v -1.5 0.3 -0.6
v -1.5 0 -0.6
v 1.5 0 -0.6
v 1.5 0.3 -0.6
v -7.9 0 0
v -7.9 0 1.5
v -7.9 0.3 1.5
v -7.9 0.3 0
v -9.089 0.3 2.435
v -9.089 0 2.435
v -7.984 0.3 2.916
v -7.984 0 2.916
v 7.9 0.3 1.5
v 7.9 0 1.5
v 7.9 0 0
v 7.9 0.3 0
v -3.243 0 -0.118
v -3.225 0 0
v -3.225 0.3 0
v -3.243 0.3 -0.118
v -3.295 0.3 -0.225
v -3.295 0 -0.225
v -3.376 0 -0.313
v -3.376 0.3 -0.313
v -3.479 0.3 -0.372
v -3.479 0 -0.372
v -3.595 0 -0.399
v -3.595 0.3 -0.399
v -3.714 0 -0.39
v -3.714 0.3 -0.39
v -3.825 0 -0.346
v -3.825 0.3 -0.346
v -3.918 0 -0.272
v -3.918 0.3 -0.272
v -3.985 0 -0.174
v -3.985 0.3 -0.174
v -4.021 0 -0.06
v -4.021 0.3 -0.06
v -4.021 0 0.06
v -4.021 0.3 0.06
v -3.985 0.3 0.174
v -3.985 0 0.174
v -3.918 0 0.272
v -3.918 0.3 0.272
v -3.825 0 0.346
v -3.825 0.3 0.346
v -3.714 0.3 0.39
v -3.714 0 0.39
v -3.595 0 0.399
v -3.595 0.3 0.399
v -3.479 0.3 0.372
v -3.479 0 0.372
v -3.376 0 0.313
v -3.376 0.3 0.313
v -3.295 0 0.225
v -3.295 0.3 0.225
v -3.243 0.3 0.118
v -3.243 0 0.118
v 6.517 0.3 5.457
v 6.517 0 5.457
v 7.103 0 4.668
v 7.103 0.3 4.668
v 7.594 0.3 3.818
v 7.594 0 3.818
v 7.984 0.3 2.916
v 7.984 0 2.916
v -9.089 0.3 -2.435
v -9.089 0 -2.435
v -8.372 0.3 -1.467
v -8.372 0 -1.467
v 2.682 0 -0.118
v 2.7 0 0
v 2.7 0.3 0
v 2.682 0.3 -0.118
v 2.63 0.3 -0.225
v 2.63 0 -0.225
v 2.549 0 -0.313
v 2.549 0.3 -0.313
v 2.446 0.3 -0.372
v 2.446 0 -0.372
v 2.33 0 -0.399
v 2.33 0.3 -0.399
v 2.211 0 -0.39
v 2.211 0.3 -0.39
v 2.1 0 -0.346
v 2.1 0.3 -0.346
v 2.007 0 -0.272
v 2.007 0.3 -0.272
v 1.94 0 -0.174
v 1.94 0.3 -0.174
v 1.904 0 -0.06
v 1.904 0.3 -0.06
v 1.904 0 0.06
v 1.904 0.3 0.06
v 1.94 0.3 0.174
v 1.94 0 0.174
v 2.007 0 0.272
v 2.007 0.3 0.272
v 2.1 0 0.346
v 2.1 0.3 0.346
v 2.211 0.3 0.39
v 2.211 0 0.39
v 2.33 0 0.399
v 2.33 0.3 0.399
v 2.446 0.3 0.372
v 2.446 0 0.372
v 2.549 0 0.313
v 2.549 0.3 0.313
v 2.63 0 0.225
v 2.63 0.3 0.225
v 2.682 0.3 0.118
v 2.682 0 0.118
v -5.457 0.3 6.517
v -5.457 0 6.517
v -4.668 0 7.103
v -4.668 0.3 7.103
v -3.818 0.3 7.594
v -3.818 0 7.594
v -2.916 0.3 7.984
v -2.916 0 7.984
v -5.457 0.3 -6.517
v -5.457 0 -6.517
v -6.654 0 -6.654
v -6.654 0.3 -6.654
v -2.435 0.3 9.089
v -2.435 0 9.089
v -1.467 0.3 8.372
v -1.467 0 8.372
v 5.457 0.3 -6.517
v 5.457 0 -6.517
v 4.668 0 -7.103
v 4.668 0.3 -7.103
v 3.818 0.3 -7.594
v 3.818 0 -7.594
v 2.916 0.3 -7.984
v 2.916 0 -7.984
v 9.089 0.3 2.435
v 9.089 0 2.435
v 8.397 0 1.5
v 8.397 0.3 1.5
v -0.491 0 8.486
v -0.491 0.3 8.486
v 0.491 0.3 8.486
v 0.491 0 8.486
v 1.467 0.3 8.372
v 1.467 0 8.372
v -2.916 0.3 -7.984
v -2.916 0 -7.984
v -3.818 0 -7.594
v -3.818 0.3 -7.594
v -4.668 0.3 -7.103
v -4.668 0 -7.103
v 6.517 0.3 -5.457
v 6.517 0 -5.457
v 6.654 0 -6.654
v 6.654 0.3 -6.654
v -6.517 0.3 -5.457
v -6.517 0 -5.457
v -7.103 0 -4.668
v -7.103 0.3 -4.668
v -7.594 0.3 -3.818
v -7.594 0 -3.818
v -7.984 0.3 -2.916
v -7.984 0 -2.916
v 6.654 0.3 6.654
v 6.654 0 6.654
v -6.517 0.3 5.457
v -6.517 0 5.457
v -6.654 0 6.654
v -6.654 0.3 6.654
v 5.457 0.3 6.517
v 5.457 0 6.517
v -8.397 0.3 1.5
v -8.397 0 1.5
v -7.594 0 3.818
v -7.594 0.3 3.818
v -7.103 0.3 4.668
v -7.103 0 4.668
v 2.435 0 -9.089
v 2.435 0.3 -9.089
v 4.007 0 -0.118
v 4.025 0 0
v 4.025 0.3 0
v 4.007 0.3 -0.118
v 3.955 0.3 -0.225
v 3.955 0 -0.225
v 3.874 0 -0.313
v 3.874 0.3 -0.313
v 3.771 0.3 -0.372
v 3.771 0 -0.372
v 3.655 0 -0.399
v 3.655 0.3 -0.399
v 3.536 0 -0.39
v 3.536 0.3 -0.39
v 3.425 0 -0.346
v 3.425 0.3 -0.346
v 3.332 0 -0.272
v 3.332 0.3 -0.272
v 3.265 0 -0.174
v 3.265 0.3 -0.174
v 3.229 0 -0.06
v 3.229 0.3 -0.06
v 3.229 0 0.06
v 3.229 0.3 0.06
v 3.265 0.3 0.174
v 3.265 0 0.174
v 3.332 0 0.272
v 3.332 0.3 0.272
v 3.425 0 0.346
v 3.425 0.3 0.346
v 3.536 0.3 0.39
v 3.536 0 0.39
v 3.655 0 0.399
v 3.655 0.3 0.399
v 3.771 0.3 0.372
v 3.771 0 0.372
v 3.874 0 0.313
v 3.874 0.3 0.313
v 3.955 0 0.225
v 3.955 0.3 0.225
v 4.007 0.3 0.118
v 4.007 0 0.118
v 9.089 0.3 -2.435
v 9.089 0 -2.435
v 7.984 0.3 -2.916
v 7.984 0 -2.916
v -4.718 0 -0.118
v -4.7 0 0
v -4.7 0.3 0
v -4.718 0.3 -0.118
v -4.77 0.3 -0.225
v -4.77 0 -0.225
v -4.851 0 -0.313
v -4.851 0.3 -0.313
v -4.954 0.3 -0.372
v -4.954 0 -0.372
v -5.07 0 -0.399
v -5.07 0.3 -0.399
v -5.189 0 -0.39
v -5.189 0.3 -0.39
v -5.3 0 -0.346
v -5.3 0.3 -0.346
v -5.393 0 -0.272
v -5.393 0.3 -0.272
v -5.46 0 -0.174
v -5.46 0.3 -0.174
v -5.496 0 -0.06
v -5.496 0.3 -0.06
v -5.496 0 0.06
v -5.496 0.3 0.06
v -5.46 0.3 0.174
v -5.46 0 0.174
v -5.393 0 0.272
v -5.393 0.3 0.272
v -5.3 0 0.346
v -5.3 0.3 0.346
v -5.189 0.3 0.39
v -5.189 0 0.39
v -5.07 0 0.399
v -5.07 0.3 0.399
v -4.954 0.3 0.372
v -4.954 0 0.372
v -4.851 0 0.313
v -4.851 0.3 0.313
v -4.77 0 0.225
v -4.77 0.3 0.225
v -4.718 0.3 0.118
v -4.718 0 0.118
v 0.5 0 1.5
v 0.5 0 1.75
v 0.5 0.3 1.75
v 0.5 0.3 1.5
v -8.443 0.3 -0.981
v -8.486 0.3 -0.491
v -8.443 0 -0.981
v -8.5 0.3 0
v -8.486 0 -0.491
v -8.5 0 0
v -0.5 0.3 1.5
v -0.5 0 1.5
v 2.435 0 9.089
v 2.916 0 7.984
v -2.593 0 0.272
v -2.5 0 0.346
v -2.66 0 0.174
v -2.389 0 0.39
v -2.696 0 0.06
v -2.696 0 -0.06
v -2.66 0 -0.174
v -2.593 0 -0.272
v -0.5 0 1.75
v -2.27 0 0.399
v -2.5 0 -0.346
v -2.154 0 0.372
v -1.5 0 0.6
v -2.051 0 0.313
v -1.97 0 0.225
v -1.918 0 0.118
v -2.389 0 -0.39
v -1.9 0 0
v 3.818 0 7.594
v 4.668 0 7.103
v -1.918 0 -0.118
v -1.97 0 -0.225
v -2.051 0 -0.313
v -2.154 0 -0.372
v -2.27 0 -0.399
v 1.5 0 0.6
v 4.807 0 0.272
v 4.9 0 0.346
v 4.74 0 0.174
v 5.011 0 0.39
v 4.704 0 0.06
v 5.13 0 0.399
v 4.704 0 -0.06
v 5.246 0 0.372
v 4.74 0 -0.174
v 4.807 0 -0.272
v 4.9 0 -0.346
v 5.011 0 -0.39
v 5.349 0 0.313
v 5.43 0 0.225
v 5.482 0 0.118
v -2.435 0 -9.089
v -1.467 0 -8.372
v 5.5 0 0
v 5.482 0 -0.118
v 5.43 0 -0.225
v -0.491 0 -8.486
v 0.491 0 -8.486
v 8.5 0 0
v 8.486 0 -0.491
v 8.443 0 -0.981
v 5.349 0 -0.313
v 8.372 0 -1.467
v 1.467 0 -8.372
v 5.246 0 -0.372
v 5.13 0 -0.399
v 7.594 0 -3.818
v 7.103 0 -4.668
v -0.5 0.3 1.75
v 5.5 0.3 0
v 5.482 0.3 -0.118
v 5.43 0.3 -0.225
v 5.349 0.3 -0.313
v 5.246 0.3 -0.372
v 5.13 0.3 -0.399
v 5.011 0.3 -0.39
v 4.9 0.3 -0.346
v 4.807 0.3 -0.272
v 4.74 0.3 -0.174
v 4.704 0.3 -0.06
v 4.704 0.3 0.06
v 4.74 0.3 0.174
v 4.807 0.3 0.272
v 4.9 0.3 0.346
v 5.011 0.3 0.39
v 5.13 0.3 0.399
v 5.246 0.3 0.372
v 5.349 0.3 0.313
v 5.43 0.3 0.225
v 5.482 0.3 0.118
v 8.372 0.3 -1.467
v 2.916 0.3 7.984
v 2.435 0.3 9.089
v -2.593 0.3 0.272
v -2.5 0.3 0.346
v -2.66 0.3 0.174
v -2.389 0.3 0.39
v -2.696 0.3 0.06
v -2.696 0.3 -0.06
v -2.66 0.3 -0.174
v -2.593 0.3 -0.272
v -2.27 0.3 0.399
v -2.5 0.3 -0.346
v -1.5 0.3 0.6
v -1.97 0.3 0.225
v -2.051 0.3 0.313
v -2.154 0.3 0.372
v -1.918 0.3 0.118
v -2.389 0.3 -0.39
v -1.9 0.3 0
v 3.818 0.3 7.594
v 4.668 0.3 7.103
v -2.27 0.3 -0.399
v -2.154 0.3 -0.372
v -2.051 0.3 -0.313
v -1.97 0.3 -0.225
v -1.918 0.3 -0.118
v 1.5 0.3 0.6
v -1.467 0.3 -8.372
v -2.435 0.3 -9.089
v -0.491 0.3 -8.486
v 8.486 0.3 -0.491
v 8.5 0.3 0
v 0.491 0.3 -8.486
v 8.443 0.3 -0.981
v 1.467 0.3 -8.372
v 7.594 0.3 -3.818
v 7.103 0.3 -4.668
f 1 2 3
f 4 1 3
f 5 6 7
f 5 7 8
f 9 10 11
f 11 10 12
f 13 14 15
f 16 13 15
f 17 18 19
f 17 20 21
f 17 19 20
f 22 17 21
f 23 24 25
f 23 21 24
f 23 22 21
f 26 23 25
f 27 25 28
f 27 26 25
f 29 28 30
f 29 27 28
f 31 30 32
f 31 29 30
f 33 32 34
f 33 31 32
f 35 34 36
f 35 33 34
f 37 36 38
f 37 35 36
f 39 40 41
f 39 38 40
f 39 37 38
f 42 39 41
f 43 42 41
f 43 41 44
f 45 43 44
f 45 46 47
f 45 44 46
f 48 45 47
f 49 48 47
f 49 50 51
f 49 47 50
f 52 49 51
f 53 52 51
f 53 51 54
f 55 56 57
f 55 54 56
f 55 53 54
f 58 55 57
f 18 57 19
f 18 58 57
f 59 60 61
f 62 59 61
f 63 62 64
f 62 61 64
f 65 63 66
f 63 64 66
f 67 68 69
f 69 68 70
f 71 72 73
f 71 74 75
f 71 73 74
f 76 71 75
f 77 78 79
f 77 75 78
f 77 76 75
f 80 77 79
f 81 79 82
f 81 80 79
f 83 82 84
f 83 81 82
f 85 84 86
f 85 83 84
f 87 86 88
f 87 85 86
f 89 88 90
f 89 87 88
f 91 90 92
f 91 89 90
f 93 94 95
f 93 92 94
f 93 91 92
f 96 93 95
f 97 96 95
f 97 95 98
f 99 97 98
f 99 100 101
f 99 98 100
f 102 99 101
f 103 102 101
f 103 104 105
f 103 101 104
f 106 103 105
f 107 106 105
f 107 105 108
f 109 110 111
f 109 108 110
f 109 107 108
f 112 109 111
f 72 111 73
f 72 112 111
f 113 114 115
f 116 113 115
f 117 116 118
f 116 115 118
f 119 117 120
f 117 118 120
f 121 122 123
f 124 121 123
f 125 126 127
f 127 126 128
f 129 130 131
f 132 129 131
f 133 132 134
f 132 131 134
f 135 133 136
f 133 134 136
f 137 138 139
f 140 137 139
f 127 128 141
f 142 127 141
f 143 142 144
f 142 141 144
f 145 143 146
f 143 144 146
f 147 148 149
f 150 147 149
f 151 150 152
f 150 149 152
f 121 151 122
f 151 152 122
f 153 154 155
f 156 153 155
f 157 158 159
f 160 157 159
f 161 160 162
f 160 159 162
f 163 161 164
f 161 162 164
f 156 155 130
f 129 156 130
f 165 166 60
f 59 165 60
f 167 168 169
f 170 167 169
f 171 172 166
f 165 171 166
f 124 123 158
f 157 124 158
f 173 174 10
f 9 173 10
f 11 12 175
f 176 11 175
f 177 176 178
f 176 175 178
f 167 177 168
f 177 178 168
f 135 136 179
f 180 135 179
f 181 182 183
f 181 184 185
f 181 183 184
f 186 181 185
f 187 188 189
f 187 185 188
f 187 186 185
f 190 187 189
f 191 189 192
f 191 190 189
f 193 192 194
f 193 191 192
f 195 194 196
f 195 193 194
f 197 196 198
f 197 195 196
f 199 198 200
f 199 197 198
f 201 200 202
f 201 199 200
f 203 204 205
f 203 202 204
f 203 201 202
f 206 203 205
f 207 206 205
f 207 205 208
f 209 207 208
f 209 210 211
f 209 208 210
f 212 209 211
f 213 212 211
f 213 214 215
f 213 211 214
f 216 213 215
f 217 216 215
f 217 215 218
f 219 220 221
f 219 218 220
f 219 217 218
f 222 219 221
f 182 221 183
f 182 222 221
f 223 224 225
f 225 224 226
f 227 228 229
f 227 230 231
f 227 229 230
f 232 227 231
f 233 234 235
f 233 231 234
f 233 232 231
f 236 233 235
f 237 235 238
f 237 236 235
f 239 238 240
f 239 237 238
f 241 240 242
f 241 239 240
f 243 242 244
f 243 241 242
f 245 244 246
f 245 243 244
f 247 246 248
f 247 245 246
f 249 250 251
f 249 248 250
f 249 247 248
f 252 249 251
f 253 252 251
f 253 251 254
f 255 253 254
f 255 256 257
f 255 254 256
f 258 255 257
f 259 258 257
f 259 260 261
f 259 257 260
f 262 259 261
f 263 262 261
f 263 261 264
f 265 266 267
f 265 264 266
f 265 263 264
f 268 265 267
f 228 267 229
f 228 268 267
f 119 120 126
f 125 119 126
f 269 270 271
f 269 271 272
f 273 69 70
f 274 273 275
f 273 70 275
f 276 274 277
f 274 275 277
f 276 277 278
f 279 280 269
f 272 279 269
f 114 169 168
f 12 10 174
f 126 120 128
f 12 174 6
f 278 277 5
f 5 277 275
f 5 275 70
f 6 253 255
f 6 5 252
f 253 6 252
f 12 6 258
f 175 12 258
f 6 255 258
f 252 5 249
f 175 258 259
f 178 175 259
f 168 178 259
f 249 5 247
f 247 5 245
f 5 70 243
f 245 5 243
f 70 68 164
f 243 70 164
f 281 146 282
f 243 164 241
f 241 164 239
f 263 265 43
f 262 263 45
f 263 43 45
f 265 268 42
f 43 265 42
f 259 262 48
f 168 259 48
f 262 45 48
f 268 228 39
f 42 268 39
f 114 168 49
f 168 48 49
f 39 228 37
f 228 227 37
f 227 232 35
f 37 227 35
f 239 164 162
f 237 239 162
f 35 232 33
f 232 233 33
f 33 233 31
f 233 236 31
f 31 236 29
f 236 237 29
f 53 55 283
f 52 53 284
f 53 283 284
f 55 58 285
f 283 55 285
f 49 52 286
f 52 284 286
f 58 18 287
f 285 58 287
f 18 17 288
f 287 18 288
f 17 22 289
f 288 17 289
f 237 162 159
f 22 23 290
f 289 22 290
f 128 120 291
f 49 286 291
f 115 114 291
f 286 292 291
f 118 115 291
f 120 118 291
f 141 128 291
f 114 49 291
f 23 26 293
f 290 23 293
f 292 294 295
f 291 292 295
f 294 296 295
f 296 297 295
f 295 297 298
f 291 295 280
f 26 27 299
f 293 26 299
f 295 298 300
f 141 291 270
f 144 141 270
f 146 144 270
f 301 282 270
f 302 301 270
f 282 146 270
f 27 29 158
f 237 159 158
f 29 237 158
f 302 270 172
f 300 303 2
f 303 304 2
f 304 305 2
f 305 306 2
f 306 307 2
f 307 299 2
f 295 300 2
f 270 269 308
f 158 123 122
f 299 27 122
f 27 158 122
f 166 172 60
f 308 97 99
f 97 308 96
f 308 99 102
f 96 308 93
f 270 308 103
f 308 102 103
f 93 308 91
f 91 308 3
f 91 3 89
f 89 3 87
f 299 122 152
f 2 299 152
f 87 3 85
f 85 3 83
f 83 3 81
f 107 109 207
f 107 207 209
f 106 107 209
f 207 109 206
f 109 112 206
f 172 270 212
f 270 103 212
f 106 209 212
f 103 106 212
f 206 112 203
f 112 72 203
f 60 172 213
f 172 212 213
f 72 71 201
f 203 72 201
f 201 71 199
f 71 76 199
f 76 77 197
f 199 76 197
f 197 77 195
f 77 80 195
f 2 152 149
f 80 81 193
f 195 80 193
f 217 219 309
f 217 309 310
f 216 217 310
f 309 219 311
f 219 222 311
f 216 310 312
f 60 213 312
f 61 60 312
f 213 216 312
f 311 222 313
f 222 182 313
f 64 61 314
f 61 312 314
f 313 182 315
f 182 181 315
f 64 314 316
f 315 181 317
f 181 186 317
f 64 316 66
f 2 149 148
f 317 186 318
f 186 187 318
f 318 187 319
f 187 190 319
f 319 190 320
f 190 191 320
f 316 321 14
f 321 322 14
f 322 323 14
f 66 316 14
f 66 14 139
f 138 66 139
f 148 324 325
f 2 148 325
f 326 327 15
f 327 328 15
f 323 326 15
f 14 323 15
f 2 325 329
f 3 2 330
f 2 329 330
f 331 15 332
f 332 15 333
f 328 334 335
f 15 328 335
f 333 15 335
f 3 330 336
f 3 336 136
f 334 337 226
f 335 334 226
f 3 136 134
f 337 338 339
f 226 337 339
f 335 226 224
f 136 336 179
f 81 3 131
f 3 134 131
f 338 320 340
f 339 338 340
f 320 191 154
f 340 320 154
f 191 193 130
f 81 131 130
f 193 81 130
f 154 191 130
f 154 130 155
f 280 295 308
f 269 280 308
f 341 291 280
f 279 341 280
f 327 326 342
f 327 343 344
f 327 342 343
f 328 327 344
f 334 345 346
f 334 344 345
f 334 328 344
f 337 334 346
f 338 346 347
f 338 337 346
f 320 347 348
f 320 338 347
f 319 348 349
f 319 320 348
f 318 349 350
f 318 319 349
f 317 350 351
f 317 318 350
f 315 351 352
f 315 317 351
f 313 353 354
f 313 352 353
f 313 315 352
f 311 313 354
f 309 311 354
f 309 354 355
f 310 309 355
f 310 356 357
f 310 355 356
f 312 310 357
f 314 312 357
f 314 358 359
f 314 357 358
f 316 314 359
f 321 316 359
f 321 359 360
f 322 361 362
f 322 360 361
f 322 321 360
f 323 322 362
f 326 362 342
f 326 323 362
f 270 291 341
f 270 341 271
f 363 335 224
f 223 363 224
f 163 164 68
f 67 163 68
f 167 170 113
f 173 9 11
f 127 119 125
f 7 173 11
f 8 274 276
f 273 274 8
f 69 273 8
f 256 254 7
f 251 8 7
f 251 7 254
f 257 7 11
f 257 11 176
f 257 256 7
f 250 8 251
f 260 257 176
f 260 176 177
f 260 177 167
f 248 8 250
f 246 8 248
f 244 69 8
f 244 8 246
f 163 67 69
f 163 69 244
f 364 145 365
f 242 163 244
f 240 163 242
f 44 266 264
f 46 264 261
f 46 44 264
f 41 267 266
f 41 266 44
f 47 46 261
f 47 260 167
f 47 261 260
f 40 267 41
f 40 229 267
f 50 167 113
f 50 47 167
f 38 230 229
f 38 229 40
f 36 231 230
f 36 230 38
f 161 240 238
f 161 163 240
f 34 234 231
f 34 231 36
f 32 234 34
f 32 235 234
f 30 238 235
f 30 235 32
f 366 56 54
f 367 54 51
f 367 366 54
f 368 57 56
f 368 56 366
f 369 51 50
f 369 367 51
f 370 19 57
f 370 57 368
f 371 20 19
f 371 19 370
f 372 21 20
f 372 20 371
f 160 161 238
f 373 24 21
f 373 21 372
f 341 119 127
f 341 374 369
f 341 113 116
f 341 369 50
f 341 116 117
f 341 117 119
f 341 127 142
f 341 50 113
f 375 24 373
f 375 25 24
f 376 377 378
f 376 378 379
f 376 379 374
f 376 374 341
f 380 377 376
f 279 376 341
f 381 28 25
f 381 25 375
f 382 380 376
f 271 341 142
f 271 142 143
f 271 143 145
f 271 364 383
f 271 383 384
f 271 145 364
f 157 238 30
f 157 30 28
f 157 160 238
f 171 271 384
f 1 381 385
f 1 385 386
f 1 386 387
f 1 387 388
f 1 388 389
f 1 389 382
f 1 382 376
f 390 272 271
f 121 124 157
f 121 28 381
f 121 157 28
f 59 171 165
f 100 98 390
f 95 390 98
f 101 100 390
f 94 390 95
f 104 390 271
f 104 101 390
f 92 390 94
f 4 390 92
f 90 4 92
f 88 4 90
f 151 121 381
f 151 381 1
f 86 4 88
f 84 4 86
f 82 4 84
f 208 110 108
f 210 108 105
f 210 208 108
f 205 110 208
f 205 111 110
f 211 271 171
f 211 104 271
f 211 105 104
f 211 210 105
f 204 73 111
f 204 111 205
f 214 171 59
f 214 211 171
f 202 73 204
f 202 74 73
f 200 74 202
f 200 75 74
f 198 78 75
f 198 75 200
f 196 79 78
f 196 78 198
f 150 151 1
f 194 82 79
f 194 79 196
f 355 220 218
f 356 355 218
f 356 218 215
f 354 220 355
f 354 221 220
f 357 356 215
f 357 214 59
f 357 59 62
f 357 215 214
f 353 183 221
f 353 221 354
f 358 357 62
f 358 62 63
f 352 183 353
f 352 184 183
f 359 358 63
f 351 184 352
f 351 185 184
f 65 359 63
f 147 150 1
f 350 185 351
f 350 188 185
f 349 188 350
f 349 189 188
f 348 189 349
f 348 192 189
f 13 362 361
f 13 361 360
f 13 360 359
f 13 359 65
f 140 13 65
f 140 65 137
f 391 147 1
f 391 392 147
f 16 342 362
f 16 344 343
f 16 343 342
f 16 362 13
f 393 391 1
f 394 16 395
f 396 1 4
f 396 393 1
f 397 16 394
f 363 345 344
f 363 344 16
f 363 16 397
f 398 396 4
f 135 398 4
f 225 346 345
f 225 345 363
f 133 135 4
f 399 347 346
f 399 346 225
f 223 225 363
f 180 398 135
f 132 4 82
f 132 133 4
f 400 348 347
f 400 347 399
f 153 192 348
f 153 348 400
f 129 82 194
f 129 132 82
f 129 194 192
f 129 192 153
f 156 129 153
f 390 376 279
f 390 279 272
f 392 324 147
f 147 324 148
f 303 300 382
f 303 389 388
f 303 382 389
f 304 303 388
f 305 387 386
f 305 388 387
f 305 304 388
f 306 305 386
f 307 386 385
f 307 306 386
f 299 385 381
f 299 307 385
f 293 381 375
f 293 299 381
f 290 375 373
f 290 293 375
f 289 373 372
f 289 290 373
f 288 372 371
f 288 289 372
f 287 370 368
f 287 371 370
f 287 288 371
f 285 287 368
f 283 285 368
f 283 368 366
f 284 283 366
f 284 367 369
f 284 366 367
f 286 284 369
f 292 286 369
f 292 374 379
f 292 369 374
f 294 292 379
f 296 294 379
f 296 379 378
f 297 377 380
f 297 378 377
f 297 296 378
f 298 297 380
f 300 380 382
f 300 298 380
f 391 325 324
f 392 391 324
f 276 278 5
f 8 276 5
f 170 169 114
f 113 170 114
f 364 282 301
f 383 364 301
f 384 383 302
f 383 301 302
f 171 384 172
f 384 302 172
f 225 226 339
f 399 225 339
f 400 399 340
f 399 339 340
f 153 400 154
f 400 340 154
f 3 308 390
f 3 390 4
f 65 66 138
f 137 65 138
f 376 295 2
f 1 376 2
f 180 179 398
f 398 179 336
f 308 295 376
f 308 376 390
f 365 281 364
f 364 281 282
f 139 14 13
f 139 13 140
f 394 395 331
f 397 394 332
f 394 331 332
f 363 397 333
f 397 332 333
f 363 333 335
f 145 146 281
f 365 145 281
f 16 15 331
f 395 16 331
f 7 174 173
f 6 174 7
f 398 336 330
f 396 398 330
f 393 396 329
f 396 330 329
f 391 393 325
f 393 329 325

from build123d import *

# Parameters (mm, degrees)
EXTRUDE1_DEPTH = 0.3
SKETCH3_R      = 0.4
SKETCH3_W      = 3
SKETCH3_H      = 1.2
EXTRUDE2_DEPTH = 1.3
SKETCH4_W      = 1
SKETCH4_H      = 0.25
EXTRUDE3_DEPTH = 24
SKETCH5_W      = 1.5
SKETCH5_H      = 1.5
EXTRUDE5_DEPTH = 1


with BuildPart() as part:
    # Sketch1 → Extrude1 (new body)
    with BuildSketch(Plane(origin=(0, 0, 0), x_dir=(1, 0, 0), z_dir=(0, 1, 0))):
        with BuildLine():
            Line((-2.435487214, 9.089362025), (-2.915825654, 7.984232008))
            ThreePointArc((-2.915825654, 7.984232008), (-4.25, 7.361215932), (-5.456634922, 6.517295093))
            Line((-5.456634922, 6.517295093), (-6.653874811, 6.653874811))
            Line((-6.653874811, 6.653874811), (-6.517295093, 5.456634922))
            ThreePointArc((-6.517295093, 5.456634922), (-7.361215932, 4.25), (-7.984232008, 2.915825654))
            Line((-7.984232008, 2.915825654), (-9.089362025, 2.435487214))
            Line((-9.089362025, 2.435487214), (-8.372460576, 1.466936915))
            ThreePointArc((-8.372460576, 1.466936915), (-8.5, 0), (-8.372460576, -1.466936915))
            Line((-8.372460576, -1.466936915), (-9.089362025, -2.435487214))
            Line((-9.089362025, -2.435487214), (-7.984232008, -2.915825654))
            ThreePointArc((-7.984232008, -2.915825654), (-7.361215932, -4.25), (-6.517295093, -5.456634922))
            Line((-6.517295093, -5.456634922), (-6.653874811, -6.653874811))
            Line((-6.653874811, -6.653874811), (-5.456634922, -6.517295093))
            ThreePointArc((-5.456634922, -6.517295093), (-4.25, -7.361215932), (-2.915825654, -7.984232008))
            Line((-2.915825654, -7.984232008), (-2.435487214, -9.089362025))
            Line((-2.435487214, -9.089362025), (-1.466936915, -8.372460576))
            ThreePointArc((-1.466936915, -8.372460576), (0, -8.5), (1.466936915, -8.372460576))
            Line((1.466936915, -8.372460576), (2.435487214, -9.089362025))
            Line((2.435487214, -9.089362025), (2.915825654, -7.984232008))
            ThreePointArc((2.915825654, -7.984232008), (4.25, -7.361215932), (5.456634922, -6.517295093))
            Line((5.456634922, -6.517295093), (6.653874811, -6.653874811))
            Line((6.653874811, -6.653874811), (6.517295093, -5.456634922))
            ThreePointArc((6.517295093, -5.456634922), (7.361215932, -4.25), (7.984232008, -2.915825654))
            Line((7.984232008, -2.915825654), (9.089362025, -2.435487214))
            Line((9.089362025, -2.435487214), (8.372460576, -1.466936915))
            ThreePointArc((8.372460576, -1.466936915), (8.5, 0), (8.372460576, 1.466936915))
            Line((8.372460576, 1.466936915), (9.089362025, 2.435487214))
            Line((9.089362025, 2.435487214), (7.984232008, 2.915825654))
            ThreePointArc((7.984232008, 2.915825654), (7.361215932, 4.25), (6.517295093, 5.456634922))
            Line((6.517295093, 5.456634922), (6.653874811, 6.653874811))
            Line((6.653874811, 6.653874811), (5.456634922, 6.517295093))
            ThreePointArc((5.456634922, 6.517295093), (4.25, 7.361215932), (2.915825654, 7.984232008))
            Line((2.915825654, 7.984232008), (2.435487214, 9.089362025))
            Line((2.435487214, 9.089362025), (1.466936915, 8.372460576))
            ThreePointArc((1.466936915, 8.372460576), (0, 8.5), (-1.466936915, 8.372460576))
            Line((-1.466936915, 8.372460576), (-2.435487214, 9.089362025))
        make_face()
    extrude(amount=EXTRUDE1_DEPTH)

    # Sketch3 → Extrude2 (cut, through all)
    with BuildSketch(Plane(origin=(0, 0, 0), x_dir=(1, 0, 0), z_dir=(0, 1, 0))):
        with Locations((-2.3, 0)):
            Circle(SKETCH3_R)
        with Locations((-3.625, 0)):
            Circle(SKETCH3_R)
        with Locations((-5.1, 0)):
            Circle(SKETCH3_R)
        with Locations((2.3, 0)):
            Circle(SKETCH3_R)
        with Locations((3.625, 0)):
            Circle(SKETCH3_R)
        with Locations((5.1, 0)):
            Circle(SKETCH3_R)
        Rectangle(SKETCH3_W, SKETCH3_H)
    extrude(amount=EXTRUDE2_DEPTH, mode=Mode.SUBTRACT)

    # Sketch4 → Extrude3 (cut)
    with BuildSketch(Plane(origin=(0, 0, 0), x_dir=(1, 0, 0), z_dir=(0, 1, 0))):
        with Locations((0, -1.625)):
            Rectangle(SKETCH4_W, SKETCH4_H)
    extrude(amount=EXTRUDE3_DEPTH, mode=Mode.SUBTRACT)

    # Sketch5 → Extrude5 (cut)
    with BuildSketch(Plane(origin=(0, 0, 0), x_dir=(1, 0, 0), z_dir=(0, 1, 0))):
        with Locations((-8.65, -0.75)):
            Rectangle(SKETCH5_W, SKETCH5_H)
        with Locations((8.65, -0.75)):
            Rectangle(SKETCH5_W, SKETCH5_H)
    extrude(amount=EXTRUDE5_DEPTH, mode=Mode.SUBTRACT)


solid = part.part
